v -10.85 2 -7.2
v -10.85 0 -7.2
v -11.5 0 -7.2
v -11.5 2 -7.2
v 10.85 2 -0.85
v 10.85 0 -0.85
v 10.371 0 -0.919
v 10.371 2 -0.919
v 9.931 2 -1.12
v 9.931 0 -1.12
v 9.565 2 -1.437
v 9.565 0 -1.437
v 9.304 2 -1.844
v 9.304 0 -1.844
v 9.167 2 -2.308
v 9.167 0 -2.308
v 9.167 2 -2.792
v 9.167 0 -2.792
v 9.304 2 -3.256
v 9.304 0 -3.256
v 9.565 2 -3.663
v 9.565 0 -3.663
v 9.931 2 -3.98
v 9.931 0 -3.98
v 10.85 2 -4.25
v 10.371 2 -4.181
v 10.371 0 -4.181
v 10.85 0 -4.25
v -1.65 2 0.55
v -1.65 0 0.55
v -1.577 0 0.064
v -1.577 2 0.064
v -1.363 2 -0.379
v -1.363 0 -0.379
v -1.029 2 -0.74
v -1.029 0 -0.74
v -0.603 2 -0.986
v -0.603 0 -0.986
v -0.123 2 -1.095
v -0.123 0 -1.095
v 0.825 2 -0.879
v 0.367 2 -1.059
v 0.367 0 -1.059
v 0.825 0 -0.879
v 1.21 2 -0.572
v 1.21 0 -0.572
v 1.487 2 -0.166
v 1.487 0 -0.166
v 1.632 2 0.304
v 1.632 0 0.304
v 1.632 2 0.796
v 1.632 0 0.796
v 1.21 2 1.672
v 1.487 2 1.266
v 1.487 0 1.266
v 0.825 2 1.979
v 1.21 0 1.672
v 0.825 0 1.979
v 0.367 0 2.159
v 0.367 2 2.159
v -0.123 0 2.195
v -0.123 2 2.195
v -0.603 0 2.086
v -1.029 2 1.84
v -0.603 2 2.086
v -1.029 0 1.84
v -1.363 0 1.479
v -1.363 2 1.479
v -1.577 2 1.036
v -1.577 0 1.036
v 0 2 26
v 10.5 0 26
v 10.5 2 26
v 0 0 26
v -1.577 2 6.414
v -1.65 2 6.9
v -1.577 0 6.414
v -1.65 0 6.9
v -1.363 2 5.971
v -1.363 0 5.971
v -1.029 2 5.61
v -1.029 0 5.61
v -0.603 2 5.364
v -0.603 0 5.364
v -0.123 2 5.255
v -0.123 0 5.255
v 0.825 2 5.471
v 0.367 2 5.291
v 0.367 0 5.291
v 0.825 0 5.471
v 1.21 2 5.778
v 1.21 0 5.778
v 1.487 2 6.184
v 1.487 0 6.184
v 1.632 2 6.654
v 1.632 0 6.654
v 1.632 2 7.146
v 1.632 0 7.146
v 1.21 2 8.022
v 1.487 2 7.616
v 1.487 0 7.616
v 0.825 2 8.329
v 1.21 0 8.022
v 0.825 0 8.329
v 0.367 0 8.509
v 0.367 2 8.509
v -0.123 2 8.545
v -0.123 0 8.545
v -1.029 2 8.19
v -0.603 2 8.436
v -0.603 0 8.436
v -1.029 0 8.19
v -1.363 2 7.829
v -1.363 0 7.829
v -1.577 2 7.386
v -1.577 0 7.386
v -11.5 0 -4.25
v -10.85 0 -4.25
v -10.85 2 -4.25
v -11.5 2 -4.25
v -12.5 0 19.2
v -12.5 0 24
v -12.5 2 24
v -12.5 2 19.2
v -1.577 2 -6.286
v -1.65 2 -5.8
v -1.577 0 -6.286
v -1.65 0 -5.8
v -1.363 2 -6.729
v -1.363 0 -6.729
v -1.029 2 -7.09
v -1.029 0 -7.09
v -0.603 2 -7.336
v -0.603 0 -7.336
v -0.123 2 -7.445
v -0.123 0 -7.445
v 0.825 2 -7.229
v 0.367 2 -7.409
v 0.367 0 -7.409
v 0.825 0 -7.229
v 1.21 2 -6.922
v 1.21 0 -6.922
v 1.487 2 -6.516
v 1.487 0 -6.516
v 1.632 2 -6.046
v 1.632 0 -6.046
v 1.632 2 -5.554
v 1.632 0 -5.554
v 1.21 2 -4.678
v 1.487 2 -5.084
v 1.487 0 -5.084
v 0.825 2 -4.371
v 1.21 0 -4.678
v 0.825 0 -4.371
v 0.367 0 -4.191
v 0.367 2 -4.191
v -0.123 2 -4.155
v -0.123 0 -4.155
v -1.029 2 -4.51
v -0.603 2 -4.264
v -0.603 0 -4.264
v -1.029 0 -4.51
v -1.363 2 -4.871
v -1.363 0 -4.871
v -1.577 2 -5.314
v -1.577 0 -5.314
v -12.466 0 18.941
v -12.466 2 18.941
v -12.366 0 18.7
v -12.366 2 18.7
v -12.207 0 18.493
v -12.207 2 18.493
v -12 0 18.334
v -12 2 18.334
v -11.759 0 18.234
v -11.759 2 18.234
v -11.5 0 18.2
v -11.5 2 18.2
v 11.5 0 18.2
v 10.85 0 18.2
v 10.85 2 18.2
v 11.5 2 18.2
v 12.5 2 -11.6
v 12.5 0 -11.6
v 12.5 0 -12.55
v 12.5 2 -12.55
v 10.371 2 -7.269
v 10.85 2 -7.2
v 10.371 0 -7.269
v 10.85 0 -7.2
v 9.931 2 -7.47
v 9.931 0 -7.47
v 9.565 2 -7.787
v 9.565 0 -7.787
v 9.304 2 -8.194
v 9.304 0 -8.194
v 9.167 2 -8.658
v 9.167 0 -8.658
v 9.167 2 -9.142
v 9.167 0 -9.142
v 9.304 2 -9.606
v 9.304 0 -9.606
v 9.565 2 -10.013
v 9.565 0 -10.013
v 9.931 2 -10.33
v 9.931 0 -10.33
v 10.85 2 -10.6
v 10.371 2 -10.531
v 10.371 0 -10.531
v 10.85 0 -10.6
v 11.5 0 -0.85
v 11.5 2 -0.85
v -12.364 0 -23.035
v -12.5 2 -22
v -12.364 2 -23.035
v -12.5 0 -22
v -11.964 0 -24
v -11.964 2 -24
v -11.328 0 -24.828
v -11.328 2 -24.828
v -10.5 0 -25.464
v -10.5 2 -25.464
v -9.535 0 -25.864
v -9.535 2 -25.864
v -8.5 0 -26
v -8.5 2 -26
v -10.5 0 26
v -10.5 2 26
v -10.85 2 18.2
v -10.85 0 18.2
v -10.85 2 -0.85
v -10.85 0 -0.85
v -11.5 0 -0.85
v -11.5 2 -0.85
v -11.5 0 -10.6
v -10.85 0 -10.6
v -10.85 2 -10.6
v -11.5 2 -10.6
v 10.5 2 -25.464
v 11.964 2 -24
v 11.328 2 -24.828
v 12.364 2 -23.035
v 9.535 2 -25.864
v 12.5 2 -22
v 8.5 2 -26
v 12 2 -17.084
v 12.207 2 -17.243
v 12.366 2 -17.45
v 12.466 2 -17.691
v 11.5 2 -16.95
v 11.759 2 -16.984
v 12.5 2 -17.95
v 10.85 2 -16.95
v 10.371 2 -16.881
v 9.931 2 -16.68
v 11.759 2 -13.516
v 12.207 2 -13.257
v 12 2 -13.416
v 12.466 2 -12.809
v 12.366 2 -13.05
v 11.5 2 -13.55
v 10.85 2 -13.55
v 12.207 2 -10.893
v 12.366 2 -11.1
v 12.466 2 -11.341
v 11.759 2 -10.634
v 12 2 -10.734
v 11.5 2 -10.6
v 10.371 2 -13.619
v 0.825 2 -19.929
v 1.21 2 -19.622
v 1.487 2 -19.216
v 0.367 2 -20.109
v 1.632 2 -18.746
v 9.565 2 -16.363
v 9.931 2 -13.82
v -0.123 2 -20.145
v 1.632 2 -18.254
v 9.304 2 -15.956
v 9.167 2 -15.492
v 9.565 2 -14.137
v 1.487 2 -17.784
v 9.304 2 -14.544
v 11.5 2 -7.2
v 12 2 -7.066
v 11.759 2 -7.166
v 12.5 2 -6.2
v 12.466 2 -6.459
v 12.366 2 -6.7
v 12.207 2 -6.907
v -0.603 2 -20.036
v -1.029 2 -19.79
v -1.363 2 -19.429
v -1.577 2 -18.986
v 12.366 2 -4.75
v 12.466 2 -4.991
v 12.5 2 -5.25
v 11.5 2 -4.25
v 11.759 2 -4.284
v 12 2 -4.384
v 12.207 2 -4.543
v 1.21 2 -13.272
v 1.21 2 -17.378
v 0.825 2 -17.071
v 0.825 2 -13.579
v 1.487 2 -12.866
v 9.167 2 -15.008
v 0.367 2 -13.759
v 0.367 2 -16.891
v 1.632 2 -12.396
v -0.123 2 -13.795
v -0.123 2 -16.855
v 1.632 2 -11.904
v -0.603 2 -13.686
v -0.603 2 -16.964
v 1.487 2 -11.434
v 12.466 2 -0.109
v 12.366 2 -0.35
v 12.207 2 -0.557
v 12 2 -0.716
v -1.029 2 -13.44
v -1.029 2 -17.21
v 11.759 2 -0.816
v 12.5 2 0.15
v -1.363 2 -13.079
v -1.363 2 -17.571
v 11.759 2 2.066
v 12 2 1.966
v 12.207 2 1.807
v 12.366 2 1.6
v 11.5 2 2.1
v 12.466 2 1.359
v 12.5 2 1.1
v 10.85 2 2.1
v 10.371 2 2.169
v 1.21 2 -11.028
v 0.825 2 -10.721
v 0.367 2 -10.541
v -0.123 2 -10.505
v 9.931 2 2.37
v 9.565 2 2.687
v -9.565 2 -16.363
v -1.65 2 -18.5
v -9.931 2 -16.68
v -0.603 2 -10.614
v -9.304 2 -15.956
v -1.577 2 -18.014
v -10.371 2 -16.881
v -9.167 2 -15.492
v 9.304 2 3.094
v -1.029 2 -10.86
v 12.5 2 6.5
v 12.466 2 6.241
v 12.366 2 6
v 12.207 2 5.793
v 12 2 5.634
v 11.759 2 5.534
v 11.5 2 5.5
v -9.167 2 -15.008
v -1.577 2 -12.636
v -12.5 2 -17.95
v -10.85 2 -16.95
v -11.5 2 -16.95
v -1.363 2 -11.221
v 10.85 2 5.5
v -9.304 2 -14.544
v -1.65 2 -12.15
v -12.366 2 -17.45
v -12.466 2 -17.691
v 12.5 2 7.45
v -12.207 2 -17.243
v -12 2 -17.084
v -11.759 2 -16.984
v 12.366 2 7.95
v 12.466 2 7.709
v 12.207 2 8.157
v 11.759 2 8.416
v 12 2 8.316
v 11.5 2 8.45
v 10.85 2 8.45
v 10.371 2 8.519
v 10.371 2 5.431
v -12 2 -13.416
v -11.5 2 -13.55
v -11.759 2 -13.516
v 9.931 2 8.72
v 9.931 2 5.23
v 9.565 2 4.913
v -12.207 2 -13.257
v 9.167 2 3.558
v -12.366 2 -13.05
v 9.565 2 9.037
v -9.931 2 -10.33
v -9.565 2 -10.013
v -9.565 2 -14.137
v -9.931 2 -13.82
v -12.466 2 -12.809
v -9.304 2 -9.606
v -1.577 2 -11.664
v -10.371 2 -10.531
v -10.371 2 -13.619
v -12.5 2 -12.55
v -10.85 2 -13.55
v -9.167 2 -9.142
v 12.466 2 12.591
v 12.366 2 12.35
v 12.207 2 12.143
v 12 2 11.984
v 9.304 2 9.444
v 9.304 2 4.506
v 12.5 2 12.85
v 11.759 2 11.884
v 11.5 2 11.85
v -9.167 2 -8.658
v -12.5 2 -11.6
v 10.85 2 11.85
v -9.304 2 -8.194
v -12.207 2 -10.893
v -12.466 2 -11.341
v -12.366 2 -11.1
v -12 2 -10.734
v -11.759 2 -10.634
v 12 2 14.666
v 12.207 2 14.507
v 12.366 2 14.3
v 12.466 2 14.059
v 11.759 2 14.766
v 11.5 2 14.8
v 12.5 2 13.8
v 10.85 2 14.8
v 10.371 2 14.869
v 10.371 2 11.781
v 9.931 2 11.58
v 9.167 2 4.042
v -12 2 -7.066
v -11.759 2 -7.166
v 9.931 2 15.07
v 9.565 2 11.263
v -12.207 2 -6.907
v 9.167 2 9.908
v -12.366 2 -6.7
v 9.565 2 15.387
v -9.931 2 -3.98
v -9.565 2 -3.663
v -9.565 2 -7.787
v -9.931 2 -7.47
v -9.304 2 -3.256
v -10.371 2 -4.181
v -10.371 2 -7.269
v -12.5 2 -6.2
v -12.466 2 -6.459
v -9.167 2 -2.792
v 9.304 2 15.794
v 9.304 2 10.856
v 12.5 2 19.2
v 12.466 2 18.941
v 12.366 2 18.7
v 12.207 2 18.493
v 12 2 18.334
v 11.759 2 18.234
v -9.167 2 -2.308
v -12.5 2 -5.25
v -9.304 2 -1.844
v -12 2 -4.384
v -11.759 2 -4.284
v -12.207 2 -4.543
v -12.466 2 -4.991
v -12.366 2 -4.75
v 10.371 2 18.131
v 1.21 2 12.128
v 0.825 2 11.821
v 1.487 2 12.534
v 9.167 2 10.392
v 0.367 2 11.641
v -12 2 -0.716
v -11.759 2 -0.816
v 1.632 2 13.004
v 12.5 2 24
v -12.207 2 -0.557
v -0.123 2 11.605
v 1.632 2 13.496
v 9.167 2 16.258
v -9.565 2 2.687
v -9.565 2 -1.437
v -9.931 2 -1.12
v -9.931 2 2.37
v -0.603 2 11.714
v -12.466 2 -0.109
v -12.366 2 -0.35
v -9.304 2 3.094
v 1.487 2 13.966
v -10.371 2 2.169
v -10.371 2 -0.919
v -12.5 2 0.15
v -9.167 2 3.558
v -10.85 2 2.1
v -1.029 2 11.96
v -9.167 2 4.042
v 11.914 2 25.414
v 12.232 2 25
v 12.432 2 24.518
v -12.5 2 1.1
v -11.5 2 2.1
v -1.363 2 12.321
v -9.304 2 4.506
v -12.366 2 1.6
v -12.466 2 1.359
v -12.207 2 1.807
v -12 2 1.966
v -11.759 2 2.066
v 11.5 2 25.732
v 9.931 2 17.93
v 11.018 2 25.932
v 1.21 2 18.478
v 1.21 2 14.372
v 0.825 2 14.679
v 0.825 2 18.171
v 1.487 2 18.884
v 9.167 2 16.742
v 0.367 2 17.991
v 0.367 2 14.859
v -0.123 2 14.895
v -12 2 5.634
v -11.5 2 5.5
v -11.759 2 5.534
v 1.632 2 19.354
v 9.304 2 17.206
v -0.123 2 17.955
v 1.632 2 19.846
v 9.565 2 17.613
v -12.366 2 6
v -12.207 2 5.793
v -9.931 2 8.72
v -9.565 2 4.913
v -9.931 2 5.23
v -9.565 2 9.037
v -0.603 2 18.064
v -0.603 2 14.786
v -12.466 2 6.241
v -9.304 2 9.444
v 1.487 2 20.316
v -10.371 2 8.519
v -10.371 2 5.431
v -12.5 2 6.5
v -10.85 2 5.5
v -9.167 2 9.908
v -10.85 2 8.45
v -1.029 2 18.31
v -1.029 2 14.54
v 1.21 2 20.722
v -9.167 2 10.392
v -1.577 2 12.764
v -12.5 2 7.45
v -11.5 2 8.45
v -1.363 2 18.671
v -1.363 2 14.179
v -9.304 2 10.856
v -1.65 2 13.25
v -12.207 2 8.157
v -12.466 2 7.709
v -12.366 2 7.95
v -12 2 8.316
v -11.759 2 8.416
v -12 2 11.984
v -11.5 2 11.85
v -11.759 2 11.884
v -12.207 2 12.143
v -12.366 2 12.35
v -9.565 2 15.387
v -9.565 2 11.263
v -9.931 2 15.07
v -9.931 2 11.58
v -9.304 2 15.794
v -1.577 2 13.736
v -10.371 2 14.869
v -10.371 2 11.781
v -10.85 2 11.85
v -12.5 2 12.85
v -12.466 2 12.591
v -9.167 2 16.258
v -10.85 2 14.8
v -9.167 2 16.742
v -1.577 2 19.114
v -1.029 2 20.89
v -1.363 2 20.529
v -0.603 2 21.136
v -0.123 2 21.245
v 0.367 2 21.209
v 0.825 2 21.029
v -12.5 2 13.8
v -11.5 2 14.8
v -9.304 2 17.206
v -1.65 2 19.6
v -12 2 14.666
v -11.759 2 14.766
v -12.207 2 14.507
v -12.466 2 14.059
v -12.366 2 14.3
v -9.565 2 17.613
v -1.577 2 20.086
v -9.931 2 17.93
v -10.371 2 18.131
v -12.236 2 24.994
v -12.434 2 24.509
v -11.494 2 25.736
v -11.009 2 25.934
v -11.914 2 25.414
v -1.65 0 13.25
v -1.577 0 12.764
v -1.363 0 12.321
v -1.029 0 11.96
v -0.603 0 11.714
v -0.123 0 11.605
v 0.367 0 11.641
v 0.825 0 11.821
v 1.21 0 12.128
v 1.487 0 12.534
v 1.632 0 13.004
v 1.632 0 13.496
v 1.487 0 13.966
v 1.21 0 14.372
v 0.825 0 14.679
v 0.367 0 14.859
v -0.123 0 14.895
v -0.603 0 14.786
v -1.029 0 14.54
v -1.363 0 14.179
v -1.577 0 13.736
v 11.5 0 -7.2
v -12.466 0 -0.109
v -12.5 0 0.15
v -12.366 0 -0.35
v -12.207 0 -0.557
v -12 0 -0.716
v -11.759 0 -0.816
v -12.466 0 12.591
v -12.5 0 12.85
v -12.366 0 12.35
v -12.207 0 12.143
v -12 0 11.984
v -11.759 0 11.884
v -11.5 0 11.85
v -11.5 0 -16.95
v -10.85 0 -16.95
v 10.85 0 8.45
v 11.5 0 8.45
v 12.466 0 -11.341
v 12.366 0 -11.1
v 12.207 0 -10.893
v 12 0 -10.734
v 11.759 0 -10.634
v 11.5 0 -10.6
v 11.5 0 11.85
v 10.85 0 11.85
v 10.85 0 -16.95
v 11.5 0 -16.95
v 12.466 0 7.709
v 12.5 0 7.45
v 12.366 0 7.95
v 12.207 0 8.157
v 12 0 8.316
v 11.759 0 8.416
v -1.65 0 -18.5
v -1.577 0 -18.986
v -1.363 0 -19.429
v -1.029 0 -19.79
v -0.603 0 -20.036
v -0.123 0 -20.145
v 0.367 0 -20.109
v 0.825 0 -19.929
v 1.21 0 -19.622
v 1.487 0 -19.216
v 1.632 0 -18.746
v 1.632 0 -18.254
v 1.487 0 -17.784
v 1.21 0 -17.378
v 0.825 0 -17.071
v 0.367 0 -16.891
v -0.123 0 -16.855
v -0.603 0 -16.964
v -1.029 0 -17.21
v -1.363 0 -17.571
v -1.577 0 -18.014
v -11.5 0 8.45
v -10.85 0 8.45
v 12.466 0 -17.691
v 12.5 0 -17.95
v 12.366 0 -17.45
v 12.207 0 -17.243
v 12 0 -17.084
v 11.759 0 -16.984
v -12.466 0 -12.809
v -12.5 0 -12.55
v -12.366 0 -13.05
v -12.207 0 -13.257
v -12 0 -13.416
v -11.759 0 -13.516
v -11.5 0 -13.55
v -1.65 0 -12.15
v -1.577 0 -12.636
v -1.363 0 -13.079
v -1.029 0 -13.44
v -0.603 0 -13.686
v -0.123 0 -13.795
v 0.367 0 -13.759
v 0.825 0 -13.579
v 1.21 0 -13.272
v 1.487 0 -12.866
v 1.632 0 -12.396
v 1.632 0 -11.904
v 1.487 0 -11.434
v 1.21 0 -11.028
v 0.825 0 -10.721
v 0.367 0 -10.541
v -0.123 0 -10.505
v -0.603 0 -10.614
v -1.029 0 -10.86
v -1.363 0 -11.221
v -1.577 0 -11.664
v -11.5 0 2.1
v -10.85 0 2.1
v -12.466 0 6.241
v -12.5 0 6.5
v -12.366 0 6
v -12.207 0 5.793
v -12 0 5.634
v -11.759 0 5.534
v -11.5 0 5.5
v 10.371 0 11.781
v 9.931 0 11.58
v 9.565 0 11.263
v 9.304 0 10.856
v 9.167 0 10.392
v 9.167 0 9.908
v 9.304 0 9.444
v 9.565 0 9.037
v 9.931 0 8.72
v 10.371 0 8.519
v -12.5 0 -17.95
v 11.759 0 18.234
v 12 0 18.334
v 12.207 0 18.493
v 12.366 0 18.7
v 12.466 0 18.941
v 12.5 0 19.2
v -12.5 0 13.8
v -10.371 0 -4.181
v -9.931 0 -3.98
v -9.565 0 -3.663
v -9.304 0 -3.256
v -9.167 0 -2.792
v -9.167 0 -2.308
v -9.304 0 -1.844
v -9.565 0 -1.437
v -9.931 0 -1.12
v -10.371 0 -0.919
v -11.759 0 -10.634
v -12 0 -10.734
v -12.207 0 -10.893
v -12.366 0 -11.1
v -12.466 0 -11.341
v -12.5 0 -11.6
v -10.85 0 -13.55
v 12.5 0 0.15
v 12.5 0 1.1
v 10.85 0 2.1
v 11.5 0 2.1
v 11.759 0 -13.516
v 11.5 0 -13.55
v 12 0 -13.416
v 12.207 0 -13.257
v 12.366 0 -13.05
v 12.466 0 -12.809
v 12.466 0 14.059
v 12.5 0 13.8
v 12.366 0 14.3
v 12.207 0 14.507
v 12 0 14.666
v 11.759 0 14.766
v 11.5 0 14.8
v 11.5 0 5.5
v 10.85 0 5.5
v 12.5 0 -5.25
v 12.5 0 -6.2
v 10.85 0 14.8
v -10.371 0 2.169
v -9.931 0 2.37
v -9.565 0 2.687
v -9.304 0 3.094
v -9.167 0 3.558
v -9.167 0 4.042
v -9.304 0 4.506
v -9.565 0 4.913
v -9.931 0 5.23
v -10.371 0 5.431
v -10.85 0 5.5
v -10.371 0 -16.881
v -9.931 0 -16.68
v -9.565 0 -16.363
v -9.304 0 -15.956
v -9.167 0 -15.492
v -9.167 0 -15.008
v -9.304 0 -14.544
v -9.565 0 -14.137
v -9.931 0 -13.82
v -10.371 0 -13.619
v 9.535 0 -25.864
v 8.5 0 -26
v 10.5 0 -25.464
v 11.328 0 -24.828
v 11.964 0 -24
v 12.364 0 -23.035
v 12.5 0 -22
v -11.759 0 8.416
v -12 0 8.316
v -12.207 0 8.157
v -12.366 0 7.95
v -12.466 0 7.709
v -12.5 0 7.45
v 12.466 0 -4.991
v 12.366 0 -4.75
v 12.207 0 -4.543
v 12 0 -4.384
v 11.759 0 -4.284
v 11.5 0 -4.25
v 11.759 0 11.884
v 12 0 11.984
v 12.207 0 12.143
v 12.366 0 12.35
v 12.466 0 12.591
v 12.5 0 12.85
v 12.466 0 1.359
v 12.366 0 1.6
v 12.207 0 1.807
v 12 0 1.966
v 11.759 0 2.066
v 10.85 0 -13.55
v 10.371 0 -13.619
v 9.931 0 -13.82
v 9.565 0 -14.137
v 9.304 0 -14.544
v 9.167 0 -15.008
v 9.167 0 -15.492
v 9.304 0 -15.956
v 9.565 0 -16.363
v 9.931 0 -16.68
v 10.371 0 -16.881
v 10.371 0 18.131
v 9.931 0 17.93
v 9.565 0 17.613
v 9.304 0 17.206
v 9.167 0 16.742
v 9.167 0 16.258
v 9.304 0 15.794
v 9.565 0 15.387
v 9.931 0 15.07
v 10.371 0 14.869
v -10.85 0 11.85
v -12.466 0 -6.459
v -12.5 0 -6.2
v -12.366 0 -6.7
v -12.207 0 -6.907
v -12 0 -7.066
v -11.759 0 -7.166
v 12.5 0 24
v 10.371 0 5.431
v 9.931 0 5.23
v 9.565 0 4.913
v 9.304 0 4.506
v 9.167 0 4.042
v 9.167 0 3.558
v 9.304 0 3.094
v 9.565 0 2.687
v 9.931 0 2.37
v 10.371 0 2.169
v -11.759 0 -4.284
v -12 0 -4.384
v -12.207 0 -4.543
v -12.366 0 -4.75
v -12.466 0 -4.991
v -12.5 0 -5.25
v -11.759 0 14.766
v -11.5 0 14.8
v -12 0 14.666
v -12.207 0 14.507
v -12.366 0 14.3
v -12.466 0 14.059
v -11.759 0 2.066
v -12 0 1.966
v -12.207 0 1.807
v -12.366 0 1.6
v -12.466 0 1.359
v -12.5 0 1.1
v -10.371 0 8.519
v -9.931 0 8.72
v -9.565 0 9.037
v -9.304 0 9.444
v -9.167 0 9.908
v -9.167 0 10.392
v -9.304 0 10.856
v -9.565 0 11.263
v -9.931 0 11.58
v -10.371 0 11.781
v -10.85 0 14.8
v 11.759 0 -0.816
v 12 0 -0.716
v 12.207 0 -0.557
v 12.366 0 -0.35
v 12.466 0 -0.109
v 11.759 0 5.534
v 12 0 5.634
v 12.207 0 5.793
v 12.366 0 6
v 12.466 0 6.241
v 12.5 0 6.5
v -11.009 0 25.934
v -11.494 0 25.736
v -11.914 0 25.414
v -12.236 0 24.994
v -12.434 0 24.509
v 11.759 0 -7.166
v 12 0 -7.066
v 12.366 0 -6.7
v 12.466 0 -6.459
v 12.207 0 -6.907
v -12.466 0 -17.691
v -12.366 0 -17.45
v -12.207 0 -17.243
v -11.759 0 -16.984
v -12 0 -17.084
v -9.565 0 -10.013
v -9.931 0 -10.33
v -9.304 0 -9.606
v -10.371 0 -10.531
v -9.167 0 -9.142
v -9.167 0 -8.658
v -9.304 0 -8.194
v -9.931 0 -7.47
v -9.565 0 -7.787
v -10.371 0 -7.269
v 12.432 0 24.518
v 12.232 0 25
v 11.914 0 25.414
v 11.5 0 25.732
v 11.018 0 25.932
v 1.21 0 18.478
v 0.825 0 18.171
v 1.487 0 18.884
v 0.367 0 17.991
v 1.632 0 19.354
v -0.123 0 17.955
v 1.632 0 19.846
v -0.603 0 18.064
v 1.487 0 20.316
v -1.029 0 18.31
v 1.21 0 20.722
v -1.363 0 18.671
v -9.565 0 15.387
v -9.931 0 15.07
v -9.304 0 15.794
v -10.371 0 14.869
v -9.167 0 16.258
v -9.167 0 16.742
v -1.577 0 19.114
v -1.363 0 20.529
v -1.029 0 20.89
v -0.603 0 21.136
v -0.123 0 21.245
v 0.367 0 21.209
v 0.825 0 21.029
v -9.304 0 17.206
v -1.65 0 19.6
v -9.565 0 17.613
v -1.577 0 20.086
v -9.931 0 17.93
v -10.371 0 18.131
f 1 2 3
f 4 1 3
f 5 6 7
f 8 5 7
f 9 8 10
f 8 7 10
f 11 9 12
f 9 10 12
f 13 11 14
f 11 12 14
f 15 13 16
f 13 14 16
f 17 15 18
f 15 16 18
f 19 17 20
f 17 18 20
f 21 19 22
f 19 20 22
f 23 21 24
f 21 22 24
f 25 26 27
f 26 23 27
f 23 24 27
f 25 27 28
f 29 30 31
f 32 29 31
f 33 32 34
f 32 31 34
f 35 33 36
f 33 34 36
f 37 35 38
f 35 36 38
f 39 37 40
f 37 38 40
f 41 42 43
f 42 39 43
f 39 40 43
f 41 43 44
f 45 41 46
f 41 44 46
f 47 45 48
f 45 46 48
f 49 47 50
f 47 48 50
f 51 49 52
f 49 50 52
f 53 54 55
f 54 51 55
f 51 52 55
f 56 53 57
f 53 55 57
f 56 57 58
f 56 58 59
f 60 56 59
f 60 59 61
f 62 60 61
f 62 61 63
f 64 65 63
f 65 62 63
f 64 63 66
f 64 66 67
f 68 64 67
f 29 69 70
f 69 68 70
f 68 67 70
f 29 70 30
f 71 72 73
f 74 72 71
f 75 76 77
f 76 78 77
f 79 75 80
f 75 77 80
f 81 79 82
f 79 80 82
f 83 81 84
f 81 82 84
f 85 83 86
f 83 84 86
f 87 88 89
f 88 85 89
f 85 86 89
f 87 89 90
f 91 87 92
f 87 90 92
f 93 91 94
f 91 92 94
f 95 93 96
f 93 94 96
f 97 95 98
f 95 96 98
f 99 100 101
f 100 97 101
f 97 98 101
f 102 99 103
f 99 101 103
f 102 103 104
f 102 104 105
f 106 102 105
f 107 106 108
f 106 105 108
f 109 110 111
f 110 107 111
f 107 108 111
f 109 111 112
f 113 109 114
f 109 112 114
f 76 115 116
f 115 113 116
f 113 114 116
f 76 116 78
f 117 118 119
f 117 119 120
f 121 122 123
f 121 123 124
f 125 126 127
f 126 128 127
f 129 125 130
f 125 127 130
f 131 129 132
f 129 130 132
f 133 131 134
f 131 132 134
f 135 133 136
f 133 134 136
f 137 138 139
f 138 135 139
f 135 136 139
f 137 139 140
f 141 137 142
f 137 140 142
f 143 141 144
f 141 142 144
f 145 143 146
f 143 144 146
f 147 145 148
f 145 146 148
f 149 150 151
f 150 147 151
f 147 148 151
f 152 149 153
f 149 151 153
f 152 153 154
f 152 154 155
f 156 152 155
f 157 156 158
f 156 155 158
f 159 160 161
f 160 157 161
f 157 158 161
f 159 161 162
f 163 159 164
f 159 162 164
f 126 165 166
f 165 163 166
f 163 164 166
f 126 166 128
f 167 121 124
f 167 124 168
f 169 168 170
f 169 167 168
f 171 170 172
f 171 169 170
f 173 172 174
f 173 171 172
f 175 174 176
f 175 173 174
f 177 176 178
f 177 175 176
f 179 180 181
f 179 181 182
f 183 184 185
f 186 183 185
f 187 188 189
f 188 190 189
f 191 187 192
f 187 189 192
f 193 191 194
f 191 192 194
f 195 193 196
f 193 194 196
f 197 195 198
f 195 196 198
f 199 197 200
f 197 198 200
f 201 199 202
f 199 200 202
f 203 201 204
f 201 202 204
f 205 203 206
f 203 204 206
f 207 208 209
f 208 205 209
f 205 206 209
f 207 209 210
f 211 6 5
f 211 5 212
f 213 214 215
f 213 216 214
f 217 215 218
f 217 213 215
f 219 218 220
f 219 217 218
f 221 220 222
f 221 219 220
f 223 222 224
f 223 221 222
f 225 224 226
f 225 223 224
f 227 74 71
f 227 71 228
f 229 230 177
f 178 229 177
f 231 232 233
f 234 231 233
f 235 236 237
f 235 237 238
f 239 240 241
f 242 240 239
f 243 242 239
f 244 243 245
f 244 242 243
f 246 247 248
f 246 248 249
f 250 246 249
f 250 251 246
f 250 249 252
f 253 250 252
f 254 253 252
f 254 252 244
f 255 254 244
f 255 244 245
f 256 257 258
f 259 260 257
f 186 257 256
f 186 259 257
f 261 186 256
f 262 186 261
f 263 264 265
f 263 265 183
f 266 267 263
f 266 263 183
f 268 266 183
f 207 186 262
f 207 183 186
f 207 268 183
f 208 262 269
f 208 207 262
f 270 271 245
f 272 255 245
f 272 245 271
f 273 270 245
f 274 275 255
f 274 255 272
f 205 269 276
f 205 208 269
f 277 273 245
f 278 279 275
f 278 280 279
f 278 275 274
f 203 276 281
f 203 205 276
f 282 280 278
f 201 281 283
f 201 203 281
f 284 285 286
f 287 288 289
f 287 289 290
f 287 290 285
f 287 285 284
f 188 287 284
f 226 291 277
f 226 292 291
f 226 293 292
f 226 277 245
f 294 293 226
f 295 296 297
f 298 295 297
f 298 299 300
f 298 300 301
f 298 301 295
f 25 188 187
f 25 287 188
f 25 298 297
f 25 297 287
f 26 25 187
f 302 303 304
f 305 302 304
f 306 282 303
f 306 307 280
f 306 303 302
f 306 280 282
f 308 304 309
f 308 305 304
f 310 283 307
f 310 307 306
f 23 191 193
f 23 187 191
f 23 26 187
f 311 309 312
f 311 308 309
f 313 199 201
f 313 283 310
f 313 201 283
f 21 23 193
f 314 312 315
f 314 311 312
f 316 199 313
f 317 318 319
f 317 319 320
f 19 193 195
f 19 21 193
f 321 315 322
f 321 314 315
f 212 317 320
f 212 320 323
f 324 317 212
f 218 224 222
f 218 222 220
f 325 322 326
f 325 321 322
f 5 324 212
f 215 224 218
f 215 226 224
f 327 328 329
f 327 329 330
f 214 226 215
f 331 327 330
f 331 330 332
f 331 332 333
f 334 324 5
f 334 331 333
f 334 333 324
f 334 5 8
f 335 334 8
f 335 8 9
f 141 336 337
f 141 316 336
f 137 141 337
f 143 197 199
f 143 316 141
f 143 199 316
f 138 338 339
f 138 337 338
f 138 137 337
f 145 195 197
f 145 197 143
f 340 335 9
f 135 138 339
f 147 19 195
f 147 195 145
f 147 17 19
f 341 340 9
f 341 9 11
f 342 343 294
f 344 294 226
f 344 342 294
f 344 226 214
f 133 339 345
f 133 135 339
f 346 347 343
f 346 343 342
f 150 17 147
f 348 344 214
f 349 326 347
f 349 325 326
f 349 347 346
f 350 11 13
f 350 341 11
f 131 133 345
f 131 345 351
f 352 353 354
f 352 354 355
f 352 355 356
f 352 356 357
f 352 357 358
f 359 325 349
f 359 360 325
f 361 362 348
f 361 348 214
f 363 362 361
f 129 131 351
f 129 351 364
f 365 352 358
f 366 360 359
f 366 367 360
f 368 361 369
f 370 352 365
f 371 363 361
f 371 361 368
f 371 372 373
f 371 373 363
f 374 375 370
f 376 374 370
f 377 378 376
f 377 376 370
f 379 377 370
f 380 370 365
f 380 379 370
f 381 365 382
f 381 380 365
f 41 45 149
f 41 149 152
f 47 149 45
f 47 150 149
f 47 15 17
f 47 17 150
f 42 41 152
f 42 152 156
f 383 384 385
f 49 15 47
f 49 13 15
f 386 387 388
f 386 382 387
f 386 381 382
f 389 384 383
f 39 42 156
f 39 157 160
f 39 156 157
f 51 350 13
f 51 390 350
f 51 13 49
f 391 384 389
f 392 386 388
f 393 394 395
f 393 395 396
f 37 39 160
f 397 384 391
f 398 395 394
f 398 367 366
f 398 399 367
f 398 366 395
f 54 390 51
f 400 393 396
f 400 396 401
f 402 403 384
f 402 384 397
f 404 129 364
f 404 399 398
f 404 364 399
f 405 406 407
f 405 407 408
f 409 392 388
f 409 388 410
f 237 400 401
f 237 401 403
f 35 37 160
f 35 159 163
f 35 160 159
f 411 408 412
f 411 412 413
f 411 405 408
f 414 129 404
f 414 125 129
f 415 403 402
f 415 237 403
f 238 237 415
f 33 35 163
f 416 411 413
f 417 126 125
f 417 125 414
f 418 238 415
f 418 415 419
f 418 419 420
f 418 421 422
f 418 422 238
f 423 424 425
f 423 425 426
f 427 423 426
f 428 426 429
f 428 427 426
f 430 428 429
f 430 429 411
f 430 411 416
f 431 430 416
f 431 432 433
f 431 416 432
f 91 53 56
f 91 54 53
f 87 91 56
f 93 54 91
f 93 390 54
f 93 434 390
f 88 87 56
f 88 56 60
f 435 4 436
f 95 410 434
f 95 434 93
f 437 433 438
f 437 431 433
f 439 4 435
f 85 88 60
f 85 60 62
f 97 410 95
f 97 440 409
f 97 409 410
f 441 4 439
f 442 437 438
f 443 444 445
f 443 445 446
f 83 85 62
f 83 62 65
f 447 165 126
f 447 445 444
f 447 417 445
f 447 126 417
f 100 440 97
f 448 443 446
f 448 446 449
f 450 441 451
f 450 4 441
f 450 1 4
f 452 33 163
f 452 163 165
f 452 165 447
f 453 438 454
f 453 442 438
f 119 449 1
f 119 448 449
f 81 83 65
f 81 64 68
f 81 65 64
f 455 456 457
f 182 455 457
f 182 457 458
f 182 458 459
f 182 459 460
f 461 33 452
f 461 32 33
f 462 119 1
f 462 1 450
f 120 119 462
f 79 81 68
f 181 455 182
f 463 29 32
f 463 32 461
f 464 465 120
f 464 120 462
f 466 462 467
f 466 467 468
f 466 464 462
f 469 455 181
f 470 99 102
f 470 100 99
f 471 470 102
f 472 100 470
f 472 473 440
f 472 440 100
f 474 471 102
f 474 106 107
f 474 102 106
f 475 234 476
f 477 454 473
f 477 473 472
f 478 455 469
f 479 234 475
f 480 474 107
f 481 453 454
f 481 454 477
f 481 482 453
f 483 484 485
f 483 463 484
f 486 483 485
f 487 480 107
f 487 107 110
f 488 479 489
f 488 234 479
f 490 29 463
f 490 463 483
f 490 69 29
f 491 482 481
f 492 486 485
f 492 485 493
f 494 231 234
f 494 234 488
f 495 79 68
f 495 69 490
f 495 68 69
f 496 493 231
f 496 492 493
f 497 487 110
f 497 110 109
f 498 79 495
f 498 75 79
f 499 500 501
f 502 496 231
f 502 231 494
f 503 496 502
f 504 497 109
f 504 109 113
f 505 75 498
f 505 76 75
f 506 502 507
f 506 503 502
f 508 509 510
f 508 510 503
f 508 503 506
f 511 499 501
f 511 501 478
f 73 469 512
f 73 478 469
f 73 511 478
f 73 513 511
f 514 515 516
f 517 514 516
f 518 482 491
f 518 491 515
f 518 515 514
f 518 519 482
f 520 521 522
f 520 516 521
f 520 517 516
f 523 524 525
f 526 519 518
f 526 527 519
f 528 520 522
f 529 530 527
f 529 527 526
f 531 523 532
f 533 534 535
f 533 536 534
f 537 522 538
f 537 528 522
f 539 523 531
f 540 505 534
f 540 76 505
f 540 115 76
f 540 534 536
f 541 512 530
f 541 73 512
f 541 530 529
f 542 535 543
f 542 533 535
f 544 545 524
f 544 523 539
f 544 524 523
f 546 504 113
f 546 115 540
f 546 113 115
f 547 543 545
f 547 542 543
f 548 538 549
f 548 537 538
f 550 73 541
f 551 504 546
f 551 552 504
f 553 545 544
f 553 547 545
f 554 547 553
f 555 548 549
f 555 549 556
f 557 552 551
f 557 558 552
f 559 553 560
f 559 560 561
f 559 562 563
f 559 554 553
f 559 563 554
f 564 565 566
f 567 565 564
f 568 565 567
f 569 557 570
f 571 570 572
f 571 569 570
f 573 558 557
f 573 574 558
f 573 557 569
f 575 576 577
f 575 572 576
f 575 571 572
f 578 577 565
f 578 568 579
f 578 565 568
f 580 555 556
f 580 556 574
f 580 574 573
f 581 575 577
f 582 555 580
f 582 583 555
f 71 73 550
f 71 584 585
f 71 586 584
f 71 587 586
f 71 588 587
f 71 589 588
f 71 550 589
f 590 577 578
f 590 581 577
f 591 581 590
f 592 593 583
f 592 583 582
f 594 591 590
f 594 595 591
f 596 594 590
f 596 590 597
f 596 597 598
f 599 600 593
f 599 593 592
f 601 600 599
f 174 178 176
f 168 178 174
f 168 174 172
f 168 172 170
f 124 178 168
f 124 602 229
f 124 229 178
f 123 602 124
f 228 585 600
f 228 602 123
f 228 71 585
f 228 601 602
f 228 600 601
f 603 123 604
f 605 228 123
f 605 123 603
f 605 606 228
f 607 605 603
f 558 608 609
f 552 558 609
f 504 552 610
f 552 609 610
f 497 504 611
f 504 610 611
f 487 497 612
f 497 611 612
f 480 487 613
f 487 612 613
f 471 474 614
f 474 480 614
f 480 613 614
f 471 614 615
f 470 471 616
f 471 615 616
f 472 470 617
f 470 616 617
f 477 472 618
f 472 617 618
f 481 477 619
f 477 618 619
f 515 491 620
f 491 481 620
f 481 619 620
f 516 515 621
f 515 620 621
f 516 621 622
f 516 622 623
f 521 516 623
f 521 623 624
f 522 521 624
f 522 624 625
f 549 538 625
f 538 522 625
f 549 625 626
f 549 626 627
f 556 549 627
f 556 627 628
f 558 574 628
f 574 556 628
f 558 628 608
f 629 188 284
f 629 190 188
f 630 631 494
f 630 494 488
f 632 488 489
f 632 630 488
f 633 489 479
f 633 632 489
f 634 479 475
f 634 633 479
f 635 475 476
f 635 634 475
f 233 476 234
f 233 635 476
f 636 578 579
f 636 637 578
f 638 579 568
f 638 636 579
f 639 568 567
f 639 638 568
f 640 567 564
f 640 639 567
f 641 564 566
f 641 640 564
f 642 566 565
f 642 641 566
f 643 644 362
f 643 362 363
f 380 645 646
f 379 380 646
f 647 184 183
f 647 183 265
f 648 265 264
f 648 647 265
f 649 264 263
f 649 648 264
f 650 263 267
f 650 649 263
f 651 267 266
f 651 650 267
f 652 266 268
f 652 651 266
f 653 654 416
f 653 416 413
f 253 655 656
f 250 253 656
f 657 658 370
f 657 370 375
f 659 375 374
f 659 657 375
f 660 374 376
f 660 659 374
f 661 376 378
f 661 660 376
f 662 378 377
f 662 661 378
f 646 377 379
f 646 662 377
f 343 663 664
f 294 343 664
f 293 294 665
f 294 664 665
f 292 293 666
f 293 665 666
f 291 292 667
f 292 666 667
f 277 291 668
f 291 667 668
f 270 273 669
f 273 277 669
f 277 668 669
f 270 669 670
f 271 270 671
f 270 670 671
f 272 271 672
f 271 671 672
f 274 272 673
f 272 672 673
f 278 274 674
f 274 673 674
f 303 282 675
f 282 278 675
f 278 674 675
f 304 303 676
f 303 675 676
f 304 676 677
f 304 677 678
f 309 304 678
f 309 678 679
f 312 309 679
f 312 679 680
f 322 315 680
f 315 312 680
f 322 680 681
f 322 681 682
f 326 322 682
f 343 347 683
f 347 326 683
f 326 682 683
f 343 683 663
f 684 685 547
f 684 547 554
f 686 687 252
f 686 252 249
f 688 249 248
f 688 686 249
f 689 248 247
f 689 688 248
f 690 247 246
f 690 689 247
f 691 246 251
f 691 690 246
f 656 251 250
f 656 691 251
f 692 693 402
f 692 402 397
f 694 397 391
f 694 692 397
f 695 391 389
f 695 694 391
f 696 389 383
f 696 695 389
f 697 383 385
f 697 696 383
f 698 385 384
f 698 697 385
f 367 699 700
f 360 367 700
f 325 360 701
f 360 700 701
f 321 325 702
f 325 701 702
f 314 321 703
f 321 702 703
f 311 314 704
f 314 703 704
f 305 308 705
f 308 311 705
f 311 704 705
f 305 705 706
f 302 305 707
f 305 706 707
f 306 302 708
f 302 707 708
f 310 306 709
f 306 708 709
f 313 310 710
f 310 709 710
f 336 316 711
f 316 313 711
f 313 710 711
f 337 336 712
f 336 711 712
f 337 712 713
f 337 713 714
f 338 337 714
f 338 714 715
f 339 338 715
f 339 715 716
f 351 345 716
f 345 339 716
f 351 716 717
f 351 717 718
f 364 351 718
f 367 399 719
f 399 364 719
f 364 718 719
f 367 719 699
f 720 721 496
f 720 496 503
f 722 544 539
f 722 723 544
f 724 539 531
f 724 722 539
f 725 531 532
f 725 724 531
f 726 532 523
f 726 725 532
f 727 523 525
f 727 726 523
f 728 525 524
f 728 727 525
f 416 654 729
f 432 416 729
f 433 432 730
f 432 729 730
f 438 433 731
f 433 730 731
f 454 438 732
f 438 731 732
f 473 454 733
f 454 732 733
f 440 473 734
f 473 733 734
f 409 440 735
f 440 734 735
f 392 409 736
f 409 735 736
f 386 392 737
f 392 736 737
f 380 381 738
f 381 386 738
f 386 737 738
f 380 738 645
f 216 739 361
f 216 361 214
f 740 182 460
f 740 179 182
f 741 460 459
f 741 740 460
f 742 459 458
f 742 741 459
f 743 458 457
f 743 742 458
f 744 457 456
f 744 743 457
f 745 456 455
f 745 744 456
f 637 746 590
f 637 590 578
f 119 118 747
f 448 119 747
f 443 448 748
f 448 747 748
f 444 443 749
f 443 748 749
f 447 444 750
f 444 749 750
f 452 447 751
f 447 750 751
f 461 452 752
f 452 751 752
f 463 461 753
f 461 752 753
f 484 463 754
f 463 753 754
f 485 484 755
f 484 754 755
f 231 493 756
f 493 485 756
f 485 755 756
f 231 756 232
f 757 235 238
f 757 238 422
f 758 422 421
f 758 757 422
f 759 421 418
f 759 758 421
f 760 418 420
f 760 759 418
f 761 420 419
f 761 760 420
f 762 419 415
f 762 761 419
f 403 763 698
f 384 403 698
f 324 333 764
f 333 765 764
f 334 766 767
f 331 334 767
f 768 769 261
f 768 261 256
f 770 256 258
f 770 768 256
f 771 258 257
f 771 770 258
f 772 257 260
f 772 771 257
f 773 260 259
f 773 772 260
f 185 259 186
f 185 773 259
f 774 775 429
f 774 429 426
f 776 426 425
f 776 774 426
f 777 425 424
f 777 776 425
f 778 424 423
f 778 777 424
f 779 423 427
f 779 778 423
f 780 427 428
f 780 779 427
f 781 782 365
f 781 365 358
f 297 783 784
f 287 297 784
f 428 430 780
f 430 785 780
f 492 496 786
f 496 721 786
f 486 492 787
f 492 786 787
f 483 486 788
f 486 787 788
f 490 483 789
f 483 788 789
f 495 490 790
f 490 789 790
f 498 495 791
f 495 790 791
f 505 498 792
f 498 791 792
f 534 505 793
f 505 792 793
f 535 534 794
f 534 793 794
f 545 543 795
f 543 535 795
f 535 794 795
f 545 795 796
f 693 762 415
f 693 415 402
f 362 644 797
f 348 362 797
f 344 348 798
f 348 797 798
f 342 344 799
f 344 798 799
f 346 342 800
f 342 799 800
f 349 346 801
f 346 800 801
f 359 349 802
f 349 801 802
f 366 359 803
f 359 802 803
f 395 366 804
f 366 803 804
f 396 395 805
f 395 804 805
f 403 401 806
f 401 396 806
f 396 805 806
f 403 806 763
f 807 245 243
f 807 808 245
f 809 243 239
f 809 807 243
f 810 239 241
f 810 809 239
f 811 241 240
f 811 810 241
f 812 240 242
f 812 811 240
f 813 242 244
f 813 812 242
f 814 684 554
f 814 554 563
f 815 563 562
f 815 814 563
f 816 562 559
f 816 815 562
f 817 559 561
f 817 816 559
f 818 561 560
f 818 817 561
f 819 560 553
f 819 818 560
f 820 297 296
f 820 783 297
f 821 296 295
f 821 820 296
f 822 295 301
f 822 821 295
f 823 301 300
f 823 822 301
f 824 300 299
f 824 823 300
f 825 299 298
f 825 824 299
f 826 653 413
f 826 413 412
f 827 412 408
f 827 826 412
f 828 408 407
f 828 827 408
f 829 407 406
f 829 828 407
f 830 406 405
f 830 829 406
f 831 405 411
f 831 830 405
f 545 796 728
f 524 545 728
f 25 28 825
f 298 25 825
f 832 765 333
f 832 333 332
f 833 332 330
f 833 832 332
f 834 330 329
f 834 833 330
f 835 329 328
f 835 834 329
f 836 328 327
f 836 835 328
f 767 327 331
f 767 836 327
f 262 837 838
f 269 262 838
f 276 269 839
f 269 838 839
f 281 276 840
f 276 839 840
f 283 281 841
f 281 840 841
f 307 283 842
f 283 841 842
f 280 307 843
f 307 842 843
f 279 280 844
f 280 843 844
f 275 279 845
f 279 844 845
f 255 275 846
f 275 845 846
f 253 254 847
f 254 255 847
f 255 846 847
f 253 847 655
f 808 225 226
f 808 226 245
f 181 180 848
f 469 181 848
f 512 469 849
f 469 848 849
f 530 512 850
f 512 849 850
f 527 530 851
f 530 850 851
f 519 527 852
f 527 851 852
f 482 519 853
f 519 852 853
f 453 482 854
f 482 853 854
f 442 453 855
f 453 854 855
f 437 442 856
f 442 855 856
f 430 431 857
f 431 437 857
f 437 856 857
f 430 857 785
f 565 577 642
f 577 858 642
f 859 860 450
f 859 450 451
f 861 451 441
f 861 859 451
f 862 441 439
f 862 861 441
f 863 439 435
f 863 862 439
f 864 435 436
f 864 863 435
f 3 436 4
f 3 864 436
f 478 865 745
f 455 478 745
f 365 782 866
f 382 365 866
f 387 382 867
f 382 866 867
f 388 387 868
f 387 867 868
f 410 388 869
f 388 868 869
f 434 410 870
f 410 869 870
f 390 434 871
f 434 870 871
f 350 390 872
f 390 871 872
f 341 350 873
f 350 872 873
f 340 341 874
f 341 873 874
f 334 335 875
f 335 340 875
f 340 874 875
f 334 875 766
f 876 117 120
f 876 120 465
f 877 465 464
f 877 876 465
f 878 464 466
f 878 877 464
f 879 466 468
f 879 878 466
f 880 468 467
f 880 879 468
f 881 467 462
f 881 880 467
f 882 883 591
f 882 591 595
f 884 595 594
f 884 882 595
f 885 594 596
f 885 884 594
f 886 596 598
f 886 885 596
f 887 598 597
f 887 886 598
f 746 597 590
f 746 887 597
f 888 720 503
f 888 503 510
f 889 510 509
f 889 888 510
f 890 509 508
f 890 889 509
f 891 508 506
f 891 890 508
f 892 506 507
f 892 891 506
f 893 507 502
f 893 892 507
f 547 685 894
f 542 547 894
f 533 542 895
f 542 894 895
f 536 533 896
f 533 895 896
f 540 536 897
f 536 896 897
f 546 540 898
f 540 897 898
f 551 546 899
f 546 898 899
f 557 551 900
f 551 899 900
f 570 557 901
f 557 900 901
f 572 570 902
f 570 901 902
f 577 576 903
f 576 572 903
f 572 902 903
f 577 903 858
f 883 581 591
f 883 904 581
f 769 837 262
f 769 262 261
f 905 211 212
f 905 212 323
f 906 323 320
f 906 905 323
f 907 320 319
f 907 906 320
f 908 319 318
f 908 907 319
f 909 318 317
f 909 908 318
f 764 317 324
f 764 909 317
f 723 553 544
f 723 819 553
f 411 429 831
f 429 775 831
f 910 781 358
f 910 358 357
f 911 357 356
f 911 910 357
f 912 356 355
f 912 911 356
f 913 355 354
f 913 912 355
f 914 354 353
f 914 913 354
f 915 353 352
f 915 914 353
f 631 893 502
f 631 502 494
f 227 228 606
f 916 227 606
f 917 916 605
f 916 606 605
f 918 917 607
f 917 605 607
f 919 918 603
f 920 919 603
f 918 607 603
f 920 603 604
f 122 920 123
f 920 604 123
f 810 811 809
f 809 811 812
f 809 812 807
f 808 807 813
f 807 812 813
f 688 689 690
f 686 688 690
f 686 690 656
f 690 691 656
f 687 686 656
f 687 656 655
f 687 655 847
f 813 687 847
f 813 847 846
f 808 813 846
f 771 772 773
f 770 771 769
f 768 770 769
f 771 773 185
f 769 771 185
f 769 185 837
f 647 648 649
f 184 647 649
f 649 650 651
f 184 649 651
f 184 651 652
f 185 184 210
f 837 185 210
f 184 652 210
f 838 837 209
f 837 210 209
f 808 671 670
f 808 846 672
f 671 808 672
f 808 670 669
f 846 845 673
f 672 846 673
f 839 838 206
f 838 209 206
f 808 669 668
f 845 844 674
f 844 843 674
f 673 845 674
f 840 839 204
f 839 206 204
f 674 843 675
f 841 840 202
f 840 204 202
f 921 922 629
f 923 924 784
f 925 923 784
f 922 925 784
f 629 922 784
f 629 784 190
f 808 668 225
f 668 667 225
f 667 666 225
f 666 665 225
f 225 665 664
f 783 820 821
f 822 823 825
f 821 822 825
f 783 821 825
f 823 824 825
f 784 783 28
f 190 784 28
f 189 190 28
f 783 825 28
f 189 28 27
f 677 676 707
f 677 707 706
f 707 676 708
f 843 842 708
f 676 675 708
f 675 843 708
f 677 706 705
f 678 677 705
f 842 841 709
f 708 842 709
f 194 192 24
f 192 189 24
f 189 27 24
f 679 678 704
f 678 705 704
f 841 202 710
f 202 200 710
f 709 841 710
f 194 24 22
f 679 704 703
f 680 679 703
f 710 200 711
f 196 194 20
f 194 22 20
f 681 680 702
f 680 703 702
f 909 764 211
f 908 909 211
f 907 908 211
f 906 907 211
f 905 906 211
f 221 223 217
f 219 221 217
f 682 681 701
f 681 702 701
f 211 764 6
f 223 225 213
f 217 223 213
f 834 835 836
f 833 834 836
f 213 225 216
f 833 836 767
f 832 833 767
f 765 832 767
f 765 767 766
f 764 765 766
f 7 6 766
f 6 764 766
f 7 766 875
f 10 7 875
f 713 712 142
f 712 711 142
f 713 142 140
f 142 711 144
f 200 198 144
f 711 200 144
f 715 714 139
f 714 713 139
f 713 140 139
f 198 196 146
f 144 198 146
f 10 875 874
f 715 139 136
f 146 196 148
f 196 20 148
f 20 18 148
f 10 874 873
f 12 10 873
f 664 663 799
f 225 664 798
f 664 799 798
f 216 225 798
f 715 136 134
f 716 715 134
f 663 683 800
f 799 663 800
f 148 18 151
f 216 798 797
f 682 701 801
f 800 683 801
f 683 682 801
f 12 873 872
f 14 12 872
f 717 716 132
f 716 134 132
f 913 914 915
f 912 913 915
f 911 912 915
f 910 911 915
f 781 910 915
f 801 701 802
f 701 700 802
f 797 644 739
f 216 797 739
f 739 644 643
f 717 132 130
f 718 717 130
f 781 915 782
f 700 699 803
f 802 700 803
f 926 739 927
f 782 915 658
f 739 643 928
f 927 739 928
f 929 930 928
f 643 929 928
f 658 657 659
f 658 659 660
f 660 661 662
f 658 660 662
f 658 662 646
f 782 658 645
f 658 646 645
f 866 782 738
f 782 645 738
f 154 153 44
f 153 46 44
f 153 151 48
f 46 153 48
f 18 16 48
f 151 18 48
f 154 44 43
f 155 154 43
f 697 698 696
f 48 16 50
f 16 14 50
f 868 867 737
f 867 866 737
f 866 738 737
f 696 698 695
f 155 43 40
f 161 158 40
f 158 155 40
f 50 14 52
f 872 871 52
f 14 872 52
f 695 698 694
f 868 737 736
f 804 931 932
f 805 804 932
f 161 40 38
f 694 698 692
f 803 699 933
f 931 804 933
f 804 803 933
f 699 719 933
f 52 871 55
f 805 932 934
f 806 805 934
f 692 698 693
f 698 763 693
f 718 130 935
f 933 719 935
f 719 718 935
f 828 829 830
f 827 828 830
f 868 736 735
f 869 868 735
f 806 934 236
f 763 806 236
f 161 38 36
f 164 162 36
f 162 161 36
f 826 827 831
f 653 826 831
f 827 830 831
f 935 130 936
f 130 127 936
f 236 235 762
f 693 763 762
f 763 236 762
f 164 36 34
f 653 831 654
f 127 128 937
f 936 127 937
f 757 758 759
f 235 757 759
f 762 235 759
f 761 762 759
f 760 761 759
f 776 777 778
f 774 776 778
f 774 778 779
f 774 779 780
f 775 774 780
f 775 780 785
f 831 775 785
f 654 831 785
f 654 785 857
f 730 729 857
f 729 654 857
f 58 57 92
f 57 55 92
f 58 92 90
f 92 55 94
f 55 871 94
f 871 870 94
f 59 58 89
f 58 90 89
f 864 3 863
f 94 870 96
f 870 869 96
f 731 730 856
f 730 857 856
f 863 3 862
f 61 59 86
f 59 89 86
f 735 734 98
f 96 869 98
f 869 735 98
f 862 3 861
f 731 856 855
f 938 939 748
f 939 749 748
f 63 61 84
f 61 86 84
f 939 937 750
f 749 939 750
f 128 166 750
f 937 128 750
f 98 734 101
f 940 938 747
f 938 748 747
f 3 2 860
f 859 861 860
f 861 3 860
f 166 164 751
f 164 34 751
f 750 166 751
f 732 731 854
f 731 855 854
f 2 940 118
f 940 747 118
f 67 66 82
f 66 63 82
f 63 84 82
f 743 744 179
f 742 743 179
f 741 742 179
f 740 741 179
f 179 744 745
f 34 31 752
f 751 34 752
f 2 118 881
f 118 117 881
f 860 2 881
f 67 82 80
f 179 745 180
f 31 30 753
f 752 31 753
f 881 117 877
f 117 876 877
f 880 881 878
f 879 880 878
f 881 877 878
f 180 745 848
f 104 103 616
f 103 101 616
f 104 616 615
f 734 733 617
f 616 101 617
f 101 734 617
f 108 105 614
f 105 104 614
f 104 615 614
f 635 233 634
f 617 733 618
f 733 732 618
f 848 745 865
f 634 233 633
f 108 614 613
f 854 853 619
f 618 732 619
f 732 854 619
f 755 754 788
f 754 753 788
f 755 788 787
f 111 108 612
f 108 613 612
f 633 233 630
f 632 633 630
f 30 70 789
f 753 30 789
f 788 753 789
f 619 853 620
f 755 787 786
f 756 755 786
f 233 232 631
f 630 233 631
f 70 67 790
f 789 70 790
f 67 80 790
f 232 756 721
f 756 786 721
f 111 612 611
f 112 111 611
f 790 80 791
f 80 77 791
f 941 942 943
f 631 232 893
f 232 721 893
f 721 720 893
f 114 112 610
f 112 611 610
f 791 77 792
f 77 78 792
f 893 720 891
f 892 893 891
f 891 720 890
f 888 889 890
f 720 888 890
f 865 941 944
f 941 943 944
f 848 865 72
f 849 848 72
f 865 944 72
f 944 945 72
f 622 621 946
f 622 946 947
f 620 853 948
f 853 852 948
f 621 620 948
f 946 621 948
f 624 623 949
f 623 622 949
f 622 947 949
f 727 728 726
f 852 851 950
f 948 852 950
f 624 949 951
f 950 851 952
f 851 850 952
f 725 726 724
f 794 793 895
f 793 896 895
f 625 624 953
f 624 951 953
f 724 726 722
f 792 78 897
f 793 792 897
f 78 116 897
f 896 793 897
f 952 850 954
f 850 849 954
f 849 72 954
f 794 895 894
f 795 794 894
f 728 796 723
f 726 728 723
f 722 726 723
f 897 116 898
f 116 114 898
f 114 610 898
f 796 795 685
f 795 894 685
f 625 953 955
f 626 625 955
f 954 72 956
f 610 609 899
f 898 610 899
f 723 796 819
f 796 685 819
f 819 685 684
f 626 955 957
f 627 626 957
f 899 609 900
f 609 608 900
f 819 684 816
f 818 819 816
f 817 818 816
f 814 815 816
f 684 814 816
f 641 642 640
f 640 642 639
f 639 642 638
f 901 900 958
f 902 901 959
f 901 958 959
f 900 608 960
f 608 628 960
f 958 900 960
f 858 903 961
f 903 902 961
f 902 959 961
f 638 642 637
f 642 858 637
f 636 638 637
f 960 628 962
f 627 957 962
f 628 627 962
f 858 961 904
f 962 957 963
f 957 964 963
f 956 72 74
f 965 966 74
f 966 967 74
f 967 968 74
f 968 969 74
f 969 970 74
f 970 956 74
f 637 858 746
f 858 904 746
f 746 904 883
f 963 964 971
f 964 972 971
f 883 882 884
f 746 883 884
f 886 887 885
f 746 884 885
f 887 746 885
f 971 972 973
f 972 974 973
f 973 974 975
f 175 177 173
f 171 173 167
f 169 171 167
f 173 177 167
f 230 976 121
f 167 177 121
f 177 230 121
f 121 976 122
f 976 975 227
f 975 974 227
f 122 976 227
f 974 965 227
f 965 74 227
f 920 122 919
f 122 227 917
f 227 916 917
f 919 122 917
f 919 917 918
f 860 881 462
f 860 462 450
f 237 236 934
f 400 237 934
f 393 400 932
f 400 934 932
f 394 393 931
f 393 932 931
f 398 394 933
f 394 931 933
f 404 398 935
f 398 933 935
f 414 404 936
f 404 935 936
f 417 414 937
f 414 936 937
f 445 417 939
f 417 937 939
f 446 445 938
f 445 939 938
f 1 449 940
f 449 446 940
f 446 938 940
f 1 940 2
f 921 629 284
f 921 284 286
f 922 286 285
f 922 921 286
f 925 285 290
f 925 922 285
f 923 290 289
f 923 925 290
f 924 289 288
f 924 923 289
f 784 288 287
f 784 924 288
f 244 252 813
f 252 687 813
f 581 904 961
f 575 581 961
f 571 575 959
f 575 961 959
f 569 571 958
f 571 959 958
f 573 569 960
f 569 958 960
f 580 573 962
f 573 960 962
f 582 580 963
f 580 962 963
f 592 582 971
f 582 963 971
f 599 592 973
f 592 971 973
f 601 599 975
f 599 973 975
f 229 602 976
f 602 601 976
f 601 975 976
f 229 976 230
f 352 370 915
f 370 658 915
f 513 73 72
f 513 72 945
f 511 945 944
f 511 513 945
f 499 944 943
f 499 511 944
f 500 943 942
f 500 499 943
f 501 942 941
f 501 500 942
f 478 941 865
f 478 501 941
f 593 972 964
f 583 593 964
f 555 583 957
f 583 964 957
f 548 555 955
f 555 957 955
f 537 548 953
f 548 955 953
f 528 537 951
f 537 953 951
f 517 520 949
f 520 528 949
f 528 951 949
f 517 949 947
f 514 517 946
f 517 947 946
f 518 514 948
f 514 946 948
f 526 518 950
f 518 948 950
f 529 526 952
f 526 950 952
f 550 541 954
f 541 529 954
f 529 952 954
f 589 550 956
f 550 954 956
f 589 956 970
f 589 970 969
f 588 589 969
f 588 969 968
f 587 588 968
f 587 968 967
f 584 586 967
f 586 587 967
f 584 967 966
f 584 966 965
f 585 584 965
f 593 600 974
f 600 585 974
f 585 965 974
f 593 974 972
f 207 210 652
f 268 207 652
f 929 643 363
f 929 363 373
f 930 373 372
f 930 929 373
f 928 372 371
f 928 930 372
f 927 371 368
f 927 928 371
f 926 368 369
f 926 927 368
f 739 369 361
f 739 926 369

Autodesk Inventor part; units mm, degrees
ref_plane "YZ Plane" through (0, 0, 0) normal (1, 0, 0) x (0, 1, 0)
ref_plane "XZ Plane" through (0, 0, 0) normal (0, 1, 0) x (-1, 0, 0)
ref_plane "XY Plane" through (0, 0, 0) normal (0, 0, 1) x (1, 0, 0)
sketch "Sketch1" plane through (0, 0, 0) normal (0, 1, 0) x (-1, 0, 0)
  line L0 (-12.5, 26) -> (12.5, 26)
  line L1 (12.5, 26) -> (12.5, 19.2)
  line L2 (8.5, -26) -> (-8.5, -26)
  circle A0 centre (0, 19.6) radius 1.65
  line L3 (0, 26) -> (10.85, 26)
  arc A1 (10.85, 18.2) -> (10.85, 14.8) centre (10.85, 16.5) ccw
  line L4 (10.85, 18.2) -> (11.5, 18.2)
  line L5 (10.85, 14.8) -> (11.5, 14.8)
  arc A2 (11.5, 18.2) -> (12.5, 19.2) centre (11.5, 19.2) ccw
  arc A3 (12.5, 13.8) -> (11.5, 14.8) centre (11.5, 13.8) ccw
  arc A4 (10.85, 11.85) -> (10.85, 8.45) centre (10.85, 10.15) ccw
  line L6 (10.85, 11.85) -> (11.5, 11.85)
  line L7 (10.85, 8.45) -> (11.5, 8.45)
  arc A5 (11.5, 11.85) -> (12.5, 12.85) centre (11.5, 12.85) ccw
  arc A6 (12.5, 7.45) -> (11.5, 8.45) centre (11.5, 7.45) ccw
  arc A7 (10.85, 5.5) -> (10.85, 2.1) centre (10.85, 3.8) ccw
  line L8 (10.85, 5.5) -> (11.5, 5.5)
  line L9 (10.85, 2.1) -> (11.5, 2.1)
  arc A8 (11.5, 5.5) -> (12.5, 6.5) centre (11.5, 6.5) ccw
  arc A9 (12.5, 1.1) -> (11.5, 2.1) centre (11.5, 1.1) ccw
  arc A10 (10.85, -0.85) -> (10.85, -4.25) centre (10.85, -2.55) ccw
  line L10 (10.85, -0.85) -> (11.5, -0.85)
  line L11 (10.85, -4.25) -> (11.5, -4.25)
  arc A11 (11.5, -0.85) -> (12.5, 0.15) centre (11.5, 0.15) ccw
  arc A12 (12.5, -5.25) -> (11.5, -4.25) centre (11.5, -5.25) ccw
  arc A13 (10.85, -7.2) -> (10.85, -10.6) centre (10.85, -8.9) ccw
  line L12 (10.85, -7.2) -> (11.5, -7.2)
  line L13 (10.85, -10.6) -> (11.5, -10.6)
  arc A14 (11.5, -7.2) -> (12.5, -6.2) centre (11.5, -6.2) ccw
  arc A15 (12.5, -11.6) -> (11.5, -10.6) centre (11.5, -11.6) ccw
  arc A16 (10.85, -13.55) -> (10.85, -16.95) centre (10.85, -15.25) ccw
  line L14 (10.85, -13.55) -> (11.5, -13.55)
  line L15 (10.85, -16.95) -> (11.5, -16.95)
  arc A17 (11.5, -13.55) -> (12.5, -12.55) centre (11.5, -12.55) ccw
  arc A18 (12.5, -17.95) -> (11.5, -16.95) centre (11.5, -17.95) ccw
  line L16 (12.5, 13.8) -> (12.5, 12.85)
  line L17 (12.5, 7.45) -> (12.5, 6.5)
  line L18 (12.5, 1.1) -> (12.5, 0.15)
  line L19 (12.5, -5.25) -> (12.5, -6.2)
  line L20 (12.5, -11.6) -> (12.5, -12.55)
  line L21 (12.5, -17.95) -> (12.5, -22)
  line L22 (-12.5, 26) -> (-12.5, 19.2)
  arc A19 (-10.85, 14.8) -> (-10.85, 18.2) centre (-10.85, 16.5) ccw
  line L23 (-10.85, 18.2) -> (-11.5, 18.2)
  line L24 (-10.85, 14.8) -> (-11.5, 14.8)
  arc A20 (-12.5, 19.2) -> (-11.5, 18.2) centre (-11.5, 19.2) ccw
  arc A21 (-11.5, 14.8) -> (-12.5, 13.8) centre (-11.5, 13.8) ccw
  arc A22 (-11.5, 8.45) -> (-12.5, 7.45) centre (-11.5, 7.45) ccw
  line L25 (-10.85, 8.45) -> (-11.5, 8.45)
  line L26 (-10.85, 11.85) -> (-11.5, 11.85)
  arc A23 (-12.5, 12.85) -> (-11.5, 11.85) centre (-11.5, 12.85) ccw
  arc A24 (-10.85, 8.45) -> (-10.85, 11.85) centre (-10.85, 10.15) ccw
  arc A25 (-11.5, 2.1) -> (-12.5, 1.1) centre (-11.5, 1.1) ccw
  line L27 (-10.85, 2.1) -> (-11.5, 2.1)
  line L28 (-10.85, 5.5) -> (-11.5, 5.5)
  arc A26 (-12.5, 6.5) -> (-11.5, 5.5) centre (-11.5, 6.5) ccw
  arc A27 (-10.85, 2.1) -> (-10.85, 5.5) centre (-10.85, 3.8) ccw
  arc A28 (-11.5, -4.25) -> (-12.5, -5.25) centre (-11.5, -5.25) ccw
  line L29 (-10.85, -4.25) -> (-11.5, -4.25)
  line L30 (-10.85, -0.85) -> (-11.5, -0.85)
  arc A29 (-12.5, 0.15) -> (-11.5, -0.85) centre (-11.5, 0.15) ccw
  arc A30 (-10.85, -4.25) -> (-10.85, -0.85) centre (-10.85, -2.55) ccw
  arc A31 (-11.5, -10.6) -> (-12.5, -11.6) centre (-11.5, -11.6) ccw
  line L31 (-10.85, -10.6) -> (-11.5, -10.6)
  line L32 (-10.85, -7.2) -> (-11.5, -7.2)
  arc A32 (-12.5, -6.2) -> (-11.5, -7.2) centre (-11.5, -6.2) ccw
  arc A33 (-10.85, -10.6) -> (-10.85, -7.2) centre (-10.85, -8.9) ccw
  arc A34 (-11.5, -16.95) -> (-12.5, -17.95) centre (-11.5, -17.95) ccw
  line L33 (-10.85, -16.95) -> (-11.5, -16.95)
  line L34 (-10.85, -13.55) -> (-11.5, -13.55)
  arc A35 (-12.5, -12.55) -> (-11.5, -13.55) centre (-11.5, -12.55) ccw
  arc A36 (-10.85, -16.95) -> (-10.85, -13.55) centre (-10.85, -15.25) ccw
  line L35 (-12.5, 13.8) -> (-12.5, 12.85)
  line L36 (-12.5, 7.45) -> (-12.5, 6.5)
  line L37 (-12.5, 1.1) -> (-12.5, 0.15)
  line L38 (-12.5, -5.25) -> (-12.5, -6.2)
  line L39 (-12.5, -11.6) -> (-12.5, -12.55)
  line L40 (-12.5, -17.95) -> (-12.5, -22)
  arc A37 (8.5, -26) -> (12.5, -22) centre (8.5, -22) ccw
  arc A38 (-12.5, -22) -> (-8.5, -26) centre (-8.5, -22) ccw
  circle A39 centre (0, 13.25) radius 1.65
  circle A40 centre (0, 6.9) radius 1.65
  circle A41 centre (0, 0.55) radius 1.65
  circle A42 centre (0, -5.8) radius 1.65
  circle A43 centre (0, -12.15) radius 1.65
  circle A44 centre (0, -18.5) radius 1.65
  point P0 (-12.5, -26)
  point P1 (12.5, -26)
  point P2 (12.5, 14.8)
  point P3 (12.5, 8.45)
  point P4 (12.5, 2.1)
  point P5 (12.5, -4.25)
  point P6 (12.5, -10.6)
  point P7 (12.5, -16.95)
  point P8 (-12.5, 14.8)
  point P9 (-12.5, 8.45)
  point P10 (-12.5, 2.1)
  point P11 (-12.5, -4.25)
  point P12 (-12.5, -10.6)
  point P13 (-12.5, -16.95)
  dimension "d0" = 52
  dimension "d1" = 25
  dimension "d3" = 3.3
  dimension "d16" = 10.85
  dimension "d18" = 1.7
  dimension "d19" = 1
  dimension "d20" = 1
  dimension "d22" = 1.7
  dimension "d23" = 1
  dimension "d24" = 1
  dimension "d26" = 1.7
  dimension "d27" = 1
  dimension "d28" = 1
  dimension "d30" = 1.7
  dimension "d31" = 1
  dimension "d32" = 1
  dimension "d34" = 1.7
  dimension "d35" = 1
  dimension "d36" = 1
  dimension "d38" = 1.7
  dimension "d39" = 1
  dimension "d40" = 1
  dimension "d42" = 4
  dimension "d44" = 3.3
  dimension "d46" = 3.3
  dimension "d48" = 3.3
  dimension "d50" = 3.3
  dimension "d52" = 3.3
  dimension "d54" = 3.3
extrude "Extrusion1" add sketch "Sketch1" along normal blind 2
fillet "Fillet2" radius 2 2 edges at (12.5, 1, 26) (-12.5, 1, 26)
properties part number "Motor Mount Bracket" material "Acrylic"
